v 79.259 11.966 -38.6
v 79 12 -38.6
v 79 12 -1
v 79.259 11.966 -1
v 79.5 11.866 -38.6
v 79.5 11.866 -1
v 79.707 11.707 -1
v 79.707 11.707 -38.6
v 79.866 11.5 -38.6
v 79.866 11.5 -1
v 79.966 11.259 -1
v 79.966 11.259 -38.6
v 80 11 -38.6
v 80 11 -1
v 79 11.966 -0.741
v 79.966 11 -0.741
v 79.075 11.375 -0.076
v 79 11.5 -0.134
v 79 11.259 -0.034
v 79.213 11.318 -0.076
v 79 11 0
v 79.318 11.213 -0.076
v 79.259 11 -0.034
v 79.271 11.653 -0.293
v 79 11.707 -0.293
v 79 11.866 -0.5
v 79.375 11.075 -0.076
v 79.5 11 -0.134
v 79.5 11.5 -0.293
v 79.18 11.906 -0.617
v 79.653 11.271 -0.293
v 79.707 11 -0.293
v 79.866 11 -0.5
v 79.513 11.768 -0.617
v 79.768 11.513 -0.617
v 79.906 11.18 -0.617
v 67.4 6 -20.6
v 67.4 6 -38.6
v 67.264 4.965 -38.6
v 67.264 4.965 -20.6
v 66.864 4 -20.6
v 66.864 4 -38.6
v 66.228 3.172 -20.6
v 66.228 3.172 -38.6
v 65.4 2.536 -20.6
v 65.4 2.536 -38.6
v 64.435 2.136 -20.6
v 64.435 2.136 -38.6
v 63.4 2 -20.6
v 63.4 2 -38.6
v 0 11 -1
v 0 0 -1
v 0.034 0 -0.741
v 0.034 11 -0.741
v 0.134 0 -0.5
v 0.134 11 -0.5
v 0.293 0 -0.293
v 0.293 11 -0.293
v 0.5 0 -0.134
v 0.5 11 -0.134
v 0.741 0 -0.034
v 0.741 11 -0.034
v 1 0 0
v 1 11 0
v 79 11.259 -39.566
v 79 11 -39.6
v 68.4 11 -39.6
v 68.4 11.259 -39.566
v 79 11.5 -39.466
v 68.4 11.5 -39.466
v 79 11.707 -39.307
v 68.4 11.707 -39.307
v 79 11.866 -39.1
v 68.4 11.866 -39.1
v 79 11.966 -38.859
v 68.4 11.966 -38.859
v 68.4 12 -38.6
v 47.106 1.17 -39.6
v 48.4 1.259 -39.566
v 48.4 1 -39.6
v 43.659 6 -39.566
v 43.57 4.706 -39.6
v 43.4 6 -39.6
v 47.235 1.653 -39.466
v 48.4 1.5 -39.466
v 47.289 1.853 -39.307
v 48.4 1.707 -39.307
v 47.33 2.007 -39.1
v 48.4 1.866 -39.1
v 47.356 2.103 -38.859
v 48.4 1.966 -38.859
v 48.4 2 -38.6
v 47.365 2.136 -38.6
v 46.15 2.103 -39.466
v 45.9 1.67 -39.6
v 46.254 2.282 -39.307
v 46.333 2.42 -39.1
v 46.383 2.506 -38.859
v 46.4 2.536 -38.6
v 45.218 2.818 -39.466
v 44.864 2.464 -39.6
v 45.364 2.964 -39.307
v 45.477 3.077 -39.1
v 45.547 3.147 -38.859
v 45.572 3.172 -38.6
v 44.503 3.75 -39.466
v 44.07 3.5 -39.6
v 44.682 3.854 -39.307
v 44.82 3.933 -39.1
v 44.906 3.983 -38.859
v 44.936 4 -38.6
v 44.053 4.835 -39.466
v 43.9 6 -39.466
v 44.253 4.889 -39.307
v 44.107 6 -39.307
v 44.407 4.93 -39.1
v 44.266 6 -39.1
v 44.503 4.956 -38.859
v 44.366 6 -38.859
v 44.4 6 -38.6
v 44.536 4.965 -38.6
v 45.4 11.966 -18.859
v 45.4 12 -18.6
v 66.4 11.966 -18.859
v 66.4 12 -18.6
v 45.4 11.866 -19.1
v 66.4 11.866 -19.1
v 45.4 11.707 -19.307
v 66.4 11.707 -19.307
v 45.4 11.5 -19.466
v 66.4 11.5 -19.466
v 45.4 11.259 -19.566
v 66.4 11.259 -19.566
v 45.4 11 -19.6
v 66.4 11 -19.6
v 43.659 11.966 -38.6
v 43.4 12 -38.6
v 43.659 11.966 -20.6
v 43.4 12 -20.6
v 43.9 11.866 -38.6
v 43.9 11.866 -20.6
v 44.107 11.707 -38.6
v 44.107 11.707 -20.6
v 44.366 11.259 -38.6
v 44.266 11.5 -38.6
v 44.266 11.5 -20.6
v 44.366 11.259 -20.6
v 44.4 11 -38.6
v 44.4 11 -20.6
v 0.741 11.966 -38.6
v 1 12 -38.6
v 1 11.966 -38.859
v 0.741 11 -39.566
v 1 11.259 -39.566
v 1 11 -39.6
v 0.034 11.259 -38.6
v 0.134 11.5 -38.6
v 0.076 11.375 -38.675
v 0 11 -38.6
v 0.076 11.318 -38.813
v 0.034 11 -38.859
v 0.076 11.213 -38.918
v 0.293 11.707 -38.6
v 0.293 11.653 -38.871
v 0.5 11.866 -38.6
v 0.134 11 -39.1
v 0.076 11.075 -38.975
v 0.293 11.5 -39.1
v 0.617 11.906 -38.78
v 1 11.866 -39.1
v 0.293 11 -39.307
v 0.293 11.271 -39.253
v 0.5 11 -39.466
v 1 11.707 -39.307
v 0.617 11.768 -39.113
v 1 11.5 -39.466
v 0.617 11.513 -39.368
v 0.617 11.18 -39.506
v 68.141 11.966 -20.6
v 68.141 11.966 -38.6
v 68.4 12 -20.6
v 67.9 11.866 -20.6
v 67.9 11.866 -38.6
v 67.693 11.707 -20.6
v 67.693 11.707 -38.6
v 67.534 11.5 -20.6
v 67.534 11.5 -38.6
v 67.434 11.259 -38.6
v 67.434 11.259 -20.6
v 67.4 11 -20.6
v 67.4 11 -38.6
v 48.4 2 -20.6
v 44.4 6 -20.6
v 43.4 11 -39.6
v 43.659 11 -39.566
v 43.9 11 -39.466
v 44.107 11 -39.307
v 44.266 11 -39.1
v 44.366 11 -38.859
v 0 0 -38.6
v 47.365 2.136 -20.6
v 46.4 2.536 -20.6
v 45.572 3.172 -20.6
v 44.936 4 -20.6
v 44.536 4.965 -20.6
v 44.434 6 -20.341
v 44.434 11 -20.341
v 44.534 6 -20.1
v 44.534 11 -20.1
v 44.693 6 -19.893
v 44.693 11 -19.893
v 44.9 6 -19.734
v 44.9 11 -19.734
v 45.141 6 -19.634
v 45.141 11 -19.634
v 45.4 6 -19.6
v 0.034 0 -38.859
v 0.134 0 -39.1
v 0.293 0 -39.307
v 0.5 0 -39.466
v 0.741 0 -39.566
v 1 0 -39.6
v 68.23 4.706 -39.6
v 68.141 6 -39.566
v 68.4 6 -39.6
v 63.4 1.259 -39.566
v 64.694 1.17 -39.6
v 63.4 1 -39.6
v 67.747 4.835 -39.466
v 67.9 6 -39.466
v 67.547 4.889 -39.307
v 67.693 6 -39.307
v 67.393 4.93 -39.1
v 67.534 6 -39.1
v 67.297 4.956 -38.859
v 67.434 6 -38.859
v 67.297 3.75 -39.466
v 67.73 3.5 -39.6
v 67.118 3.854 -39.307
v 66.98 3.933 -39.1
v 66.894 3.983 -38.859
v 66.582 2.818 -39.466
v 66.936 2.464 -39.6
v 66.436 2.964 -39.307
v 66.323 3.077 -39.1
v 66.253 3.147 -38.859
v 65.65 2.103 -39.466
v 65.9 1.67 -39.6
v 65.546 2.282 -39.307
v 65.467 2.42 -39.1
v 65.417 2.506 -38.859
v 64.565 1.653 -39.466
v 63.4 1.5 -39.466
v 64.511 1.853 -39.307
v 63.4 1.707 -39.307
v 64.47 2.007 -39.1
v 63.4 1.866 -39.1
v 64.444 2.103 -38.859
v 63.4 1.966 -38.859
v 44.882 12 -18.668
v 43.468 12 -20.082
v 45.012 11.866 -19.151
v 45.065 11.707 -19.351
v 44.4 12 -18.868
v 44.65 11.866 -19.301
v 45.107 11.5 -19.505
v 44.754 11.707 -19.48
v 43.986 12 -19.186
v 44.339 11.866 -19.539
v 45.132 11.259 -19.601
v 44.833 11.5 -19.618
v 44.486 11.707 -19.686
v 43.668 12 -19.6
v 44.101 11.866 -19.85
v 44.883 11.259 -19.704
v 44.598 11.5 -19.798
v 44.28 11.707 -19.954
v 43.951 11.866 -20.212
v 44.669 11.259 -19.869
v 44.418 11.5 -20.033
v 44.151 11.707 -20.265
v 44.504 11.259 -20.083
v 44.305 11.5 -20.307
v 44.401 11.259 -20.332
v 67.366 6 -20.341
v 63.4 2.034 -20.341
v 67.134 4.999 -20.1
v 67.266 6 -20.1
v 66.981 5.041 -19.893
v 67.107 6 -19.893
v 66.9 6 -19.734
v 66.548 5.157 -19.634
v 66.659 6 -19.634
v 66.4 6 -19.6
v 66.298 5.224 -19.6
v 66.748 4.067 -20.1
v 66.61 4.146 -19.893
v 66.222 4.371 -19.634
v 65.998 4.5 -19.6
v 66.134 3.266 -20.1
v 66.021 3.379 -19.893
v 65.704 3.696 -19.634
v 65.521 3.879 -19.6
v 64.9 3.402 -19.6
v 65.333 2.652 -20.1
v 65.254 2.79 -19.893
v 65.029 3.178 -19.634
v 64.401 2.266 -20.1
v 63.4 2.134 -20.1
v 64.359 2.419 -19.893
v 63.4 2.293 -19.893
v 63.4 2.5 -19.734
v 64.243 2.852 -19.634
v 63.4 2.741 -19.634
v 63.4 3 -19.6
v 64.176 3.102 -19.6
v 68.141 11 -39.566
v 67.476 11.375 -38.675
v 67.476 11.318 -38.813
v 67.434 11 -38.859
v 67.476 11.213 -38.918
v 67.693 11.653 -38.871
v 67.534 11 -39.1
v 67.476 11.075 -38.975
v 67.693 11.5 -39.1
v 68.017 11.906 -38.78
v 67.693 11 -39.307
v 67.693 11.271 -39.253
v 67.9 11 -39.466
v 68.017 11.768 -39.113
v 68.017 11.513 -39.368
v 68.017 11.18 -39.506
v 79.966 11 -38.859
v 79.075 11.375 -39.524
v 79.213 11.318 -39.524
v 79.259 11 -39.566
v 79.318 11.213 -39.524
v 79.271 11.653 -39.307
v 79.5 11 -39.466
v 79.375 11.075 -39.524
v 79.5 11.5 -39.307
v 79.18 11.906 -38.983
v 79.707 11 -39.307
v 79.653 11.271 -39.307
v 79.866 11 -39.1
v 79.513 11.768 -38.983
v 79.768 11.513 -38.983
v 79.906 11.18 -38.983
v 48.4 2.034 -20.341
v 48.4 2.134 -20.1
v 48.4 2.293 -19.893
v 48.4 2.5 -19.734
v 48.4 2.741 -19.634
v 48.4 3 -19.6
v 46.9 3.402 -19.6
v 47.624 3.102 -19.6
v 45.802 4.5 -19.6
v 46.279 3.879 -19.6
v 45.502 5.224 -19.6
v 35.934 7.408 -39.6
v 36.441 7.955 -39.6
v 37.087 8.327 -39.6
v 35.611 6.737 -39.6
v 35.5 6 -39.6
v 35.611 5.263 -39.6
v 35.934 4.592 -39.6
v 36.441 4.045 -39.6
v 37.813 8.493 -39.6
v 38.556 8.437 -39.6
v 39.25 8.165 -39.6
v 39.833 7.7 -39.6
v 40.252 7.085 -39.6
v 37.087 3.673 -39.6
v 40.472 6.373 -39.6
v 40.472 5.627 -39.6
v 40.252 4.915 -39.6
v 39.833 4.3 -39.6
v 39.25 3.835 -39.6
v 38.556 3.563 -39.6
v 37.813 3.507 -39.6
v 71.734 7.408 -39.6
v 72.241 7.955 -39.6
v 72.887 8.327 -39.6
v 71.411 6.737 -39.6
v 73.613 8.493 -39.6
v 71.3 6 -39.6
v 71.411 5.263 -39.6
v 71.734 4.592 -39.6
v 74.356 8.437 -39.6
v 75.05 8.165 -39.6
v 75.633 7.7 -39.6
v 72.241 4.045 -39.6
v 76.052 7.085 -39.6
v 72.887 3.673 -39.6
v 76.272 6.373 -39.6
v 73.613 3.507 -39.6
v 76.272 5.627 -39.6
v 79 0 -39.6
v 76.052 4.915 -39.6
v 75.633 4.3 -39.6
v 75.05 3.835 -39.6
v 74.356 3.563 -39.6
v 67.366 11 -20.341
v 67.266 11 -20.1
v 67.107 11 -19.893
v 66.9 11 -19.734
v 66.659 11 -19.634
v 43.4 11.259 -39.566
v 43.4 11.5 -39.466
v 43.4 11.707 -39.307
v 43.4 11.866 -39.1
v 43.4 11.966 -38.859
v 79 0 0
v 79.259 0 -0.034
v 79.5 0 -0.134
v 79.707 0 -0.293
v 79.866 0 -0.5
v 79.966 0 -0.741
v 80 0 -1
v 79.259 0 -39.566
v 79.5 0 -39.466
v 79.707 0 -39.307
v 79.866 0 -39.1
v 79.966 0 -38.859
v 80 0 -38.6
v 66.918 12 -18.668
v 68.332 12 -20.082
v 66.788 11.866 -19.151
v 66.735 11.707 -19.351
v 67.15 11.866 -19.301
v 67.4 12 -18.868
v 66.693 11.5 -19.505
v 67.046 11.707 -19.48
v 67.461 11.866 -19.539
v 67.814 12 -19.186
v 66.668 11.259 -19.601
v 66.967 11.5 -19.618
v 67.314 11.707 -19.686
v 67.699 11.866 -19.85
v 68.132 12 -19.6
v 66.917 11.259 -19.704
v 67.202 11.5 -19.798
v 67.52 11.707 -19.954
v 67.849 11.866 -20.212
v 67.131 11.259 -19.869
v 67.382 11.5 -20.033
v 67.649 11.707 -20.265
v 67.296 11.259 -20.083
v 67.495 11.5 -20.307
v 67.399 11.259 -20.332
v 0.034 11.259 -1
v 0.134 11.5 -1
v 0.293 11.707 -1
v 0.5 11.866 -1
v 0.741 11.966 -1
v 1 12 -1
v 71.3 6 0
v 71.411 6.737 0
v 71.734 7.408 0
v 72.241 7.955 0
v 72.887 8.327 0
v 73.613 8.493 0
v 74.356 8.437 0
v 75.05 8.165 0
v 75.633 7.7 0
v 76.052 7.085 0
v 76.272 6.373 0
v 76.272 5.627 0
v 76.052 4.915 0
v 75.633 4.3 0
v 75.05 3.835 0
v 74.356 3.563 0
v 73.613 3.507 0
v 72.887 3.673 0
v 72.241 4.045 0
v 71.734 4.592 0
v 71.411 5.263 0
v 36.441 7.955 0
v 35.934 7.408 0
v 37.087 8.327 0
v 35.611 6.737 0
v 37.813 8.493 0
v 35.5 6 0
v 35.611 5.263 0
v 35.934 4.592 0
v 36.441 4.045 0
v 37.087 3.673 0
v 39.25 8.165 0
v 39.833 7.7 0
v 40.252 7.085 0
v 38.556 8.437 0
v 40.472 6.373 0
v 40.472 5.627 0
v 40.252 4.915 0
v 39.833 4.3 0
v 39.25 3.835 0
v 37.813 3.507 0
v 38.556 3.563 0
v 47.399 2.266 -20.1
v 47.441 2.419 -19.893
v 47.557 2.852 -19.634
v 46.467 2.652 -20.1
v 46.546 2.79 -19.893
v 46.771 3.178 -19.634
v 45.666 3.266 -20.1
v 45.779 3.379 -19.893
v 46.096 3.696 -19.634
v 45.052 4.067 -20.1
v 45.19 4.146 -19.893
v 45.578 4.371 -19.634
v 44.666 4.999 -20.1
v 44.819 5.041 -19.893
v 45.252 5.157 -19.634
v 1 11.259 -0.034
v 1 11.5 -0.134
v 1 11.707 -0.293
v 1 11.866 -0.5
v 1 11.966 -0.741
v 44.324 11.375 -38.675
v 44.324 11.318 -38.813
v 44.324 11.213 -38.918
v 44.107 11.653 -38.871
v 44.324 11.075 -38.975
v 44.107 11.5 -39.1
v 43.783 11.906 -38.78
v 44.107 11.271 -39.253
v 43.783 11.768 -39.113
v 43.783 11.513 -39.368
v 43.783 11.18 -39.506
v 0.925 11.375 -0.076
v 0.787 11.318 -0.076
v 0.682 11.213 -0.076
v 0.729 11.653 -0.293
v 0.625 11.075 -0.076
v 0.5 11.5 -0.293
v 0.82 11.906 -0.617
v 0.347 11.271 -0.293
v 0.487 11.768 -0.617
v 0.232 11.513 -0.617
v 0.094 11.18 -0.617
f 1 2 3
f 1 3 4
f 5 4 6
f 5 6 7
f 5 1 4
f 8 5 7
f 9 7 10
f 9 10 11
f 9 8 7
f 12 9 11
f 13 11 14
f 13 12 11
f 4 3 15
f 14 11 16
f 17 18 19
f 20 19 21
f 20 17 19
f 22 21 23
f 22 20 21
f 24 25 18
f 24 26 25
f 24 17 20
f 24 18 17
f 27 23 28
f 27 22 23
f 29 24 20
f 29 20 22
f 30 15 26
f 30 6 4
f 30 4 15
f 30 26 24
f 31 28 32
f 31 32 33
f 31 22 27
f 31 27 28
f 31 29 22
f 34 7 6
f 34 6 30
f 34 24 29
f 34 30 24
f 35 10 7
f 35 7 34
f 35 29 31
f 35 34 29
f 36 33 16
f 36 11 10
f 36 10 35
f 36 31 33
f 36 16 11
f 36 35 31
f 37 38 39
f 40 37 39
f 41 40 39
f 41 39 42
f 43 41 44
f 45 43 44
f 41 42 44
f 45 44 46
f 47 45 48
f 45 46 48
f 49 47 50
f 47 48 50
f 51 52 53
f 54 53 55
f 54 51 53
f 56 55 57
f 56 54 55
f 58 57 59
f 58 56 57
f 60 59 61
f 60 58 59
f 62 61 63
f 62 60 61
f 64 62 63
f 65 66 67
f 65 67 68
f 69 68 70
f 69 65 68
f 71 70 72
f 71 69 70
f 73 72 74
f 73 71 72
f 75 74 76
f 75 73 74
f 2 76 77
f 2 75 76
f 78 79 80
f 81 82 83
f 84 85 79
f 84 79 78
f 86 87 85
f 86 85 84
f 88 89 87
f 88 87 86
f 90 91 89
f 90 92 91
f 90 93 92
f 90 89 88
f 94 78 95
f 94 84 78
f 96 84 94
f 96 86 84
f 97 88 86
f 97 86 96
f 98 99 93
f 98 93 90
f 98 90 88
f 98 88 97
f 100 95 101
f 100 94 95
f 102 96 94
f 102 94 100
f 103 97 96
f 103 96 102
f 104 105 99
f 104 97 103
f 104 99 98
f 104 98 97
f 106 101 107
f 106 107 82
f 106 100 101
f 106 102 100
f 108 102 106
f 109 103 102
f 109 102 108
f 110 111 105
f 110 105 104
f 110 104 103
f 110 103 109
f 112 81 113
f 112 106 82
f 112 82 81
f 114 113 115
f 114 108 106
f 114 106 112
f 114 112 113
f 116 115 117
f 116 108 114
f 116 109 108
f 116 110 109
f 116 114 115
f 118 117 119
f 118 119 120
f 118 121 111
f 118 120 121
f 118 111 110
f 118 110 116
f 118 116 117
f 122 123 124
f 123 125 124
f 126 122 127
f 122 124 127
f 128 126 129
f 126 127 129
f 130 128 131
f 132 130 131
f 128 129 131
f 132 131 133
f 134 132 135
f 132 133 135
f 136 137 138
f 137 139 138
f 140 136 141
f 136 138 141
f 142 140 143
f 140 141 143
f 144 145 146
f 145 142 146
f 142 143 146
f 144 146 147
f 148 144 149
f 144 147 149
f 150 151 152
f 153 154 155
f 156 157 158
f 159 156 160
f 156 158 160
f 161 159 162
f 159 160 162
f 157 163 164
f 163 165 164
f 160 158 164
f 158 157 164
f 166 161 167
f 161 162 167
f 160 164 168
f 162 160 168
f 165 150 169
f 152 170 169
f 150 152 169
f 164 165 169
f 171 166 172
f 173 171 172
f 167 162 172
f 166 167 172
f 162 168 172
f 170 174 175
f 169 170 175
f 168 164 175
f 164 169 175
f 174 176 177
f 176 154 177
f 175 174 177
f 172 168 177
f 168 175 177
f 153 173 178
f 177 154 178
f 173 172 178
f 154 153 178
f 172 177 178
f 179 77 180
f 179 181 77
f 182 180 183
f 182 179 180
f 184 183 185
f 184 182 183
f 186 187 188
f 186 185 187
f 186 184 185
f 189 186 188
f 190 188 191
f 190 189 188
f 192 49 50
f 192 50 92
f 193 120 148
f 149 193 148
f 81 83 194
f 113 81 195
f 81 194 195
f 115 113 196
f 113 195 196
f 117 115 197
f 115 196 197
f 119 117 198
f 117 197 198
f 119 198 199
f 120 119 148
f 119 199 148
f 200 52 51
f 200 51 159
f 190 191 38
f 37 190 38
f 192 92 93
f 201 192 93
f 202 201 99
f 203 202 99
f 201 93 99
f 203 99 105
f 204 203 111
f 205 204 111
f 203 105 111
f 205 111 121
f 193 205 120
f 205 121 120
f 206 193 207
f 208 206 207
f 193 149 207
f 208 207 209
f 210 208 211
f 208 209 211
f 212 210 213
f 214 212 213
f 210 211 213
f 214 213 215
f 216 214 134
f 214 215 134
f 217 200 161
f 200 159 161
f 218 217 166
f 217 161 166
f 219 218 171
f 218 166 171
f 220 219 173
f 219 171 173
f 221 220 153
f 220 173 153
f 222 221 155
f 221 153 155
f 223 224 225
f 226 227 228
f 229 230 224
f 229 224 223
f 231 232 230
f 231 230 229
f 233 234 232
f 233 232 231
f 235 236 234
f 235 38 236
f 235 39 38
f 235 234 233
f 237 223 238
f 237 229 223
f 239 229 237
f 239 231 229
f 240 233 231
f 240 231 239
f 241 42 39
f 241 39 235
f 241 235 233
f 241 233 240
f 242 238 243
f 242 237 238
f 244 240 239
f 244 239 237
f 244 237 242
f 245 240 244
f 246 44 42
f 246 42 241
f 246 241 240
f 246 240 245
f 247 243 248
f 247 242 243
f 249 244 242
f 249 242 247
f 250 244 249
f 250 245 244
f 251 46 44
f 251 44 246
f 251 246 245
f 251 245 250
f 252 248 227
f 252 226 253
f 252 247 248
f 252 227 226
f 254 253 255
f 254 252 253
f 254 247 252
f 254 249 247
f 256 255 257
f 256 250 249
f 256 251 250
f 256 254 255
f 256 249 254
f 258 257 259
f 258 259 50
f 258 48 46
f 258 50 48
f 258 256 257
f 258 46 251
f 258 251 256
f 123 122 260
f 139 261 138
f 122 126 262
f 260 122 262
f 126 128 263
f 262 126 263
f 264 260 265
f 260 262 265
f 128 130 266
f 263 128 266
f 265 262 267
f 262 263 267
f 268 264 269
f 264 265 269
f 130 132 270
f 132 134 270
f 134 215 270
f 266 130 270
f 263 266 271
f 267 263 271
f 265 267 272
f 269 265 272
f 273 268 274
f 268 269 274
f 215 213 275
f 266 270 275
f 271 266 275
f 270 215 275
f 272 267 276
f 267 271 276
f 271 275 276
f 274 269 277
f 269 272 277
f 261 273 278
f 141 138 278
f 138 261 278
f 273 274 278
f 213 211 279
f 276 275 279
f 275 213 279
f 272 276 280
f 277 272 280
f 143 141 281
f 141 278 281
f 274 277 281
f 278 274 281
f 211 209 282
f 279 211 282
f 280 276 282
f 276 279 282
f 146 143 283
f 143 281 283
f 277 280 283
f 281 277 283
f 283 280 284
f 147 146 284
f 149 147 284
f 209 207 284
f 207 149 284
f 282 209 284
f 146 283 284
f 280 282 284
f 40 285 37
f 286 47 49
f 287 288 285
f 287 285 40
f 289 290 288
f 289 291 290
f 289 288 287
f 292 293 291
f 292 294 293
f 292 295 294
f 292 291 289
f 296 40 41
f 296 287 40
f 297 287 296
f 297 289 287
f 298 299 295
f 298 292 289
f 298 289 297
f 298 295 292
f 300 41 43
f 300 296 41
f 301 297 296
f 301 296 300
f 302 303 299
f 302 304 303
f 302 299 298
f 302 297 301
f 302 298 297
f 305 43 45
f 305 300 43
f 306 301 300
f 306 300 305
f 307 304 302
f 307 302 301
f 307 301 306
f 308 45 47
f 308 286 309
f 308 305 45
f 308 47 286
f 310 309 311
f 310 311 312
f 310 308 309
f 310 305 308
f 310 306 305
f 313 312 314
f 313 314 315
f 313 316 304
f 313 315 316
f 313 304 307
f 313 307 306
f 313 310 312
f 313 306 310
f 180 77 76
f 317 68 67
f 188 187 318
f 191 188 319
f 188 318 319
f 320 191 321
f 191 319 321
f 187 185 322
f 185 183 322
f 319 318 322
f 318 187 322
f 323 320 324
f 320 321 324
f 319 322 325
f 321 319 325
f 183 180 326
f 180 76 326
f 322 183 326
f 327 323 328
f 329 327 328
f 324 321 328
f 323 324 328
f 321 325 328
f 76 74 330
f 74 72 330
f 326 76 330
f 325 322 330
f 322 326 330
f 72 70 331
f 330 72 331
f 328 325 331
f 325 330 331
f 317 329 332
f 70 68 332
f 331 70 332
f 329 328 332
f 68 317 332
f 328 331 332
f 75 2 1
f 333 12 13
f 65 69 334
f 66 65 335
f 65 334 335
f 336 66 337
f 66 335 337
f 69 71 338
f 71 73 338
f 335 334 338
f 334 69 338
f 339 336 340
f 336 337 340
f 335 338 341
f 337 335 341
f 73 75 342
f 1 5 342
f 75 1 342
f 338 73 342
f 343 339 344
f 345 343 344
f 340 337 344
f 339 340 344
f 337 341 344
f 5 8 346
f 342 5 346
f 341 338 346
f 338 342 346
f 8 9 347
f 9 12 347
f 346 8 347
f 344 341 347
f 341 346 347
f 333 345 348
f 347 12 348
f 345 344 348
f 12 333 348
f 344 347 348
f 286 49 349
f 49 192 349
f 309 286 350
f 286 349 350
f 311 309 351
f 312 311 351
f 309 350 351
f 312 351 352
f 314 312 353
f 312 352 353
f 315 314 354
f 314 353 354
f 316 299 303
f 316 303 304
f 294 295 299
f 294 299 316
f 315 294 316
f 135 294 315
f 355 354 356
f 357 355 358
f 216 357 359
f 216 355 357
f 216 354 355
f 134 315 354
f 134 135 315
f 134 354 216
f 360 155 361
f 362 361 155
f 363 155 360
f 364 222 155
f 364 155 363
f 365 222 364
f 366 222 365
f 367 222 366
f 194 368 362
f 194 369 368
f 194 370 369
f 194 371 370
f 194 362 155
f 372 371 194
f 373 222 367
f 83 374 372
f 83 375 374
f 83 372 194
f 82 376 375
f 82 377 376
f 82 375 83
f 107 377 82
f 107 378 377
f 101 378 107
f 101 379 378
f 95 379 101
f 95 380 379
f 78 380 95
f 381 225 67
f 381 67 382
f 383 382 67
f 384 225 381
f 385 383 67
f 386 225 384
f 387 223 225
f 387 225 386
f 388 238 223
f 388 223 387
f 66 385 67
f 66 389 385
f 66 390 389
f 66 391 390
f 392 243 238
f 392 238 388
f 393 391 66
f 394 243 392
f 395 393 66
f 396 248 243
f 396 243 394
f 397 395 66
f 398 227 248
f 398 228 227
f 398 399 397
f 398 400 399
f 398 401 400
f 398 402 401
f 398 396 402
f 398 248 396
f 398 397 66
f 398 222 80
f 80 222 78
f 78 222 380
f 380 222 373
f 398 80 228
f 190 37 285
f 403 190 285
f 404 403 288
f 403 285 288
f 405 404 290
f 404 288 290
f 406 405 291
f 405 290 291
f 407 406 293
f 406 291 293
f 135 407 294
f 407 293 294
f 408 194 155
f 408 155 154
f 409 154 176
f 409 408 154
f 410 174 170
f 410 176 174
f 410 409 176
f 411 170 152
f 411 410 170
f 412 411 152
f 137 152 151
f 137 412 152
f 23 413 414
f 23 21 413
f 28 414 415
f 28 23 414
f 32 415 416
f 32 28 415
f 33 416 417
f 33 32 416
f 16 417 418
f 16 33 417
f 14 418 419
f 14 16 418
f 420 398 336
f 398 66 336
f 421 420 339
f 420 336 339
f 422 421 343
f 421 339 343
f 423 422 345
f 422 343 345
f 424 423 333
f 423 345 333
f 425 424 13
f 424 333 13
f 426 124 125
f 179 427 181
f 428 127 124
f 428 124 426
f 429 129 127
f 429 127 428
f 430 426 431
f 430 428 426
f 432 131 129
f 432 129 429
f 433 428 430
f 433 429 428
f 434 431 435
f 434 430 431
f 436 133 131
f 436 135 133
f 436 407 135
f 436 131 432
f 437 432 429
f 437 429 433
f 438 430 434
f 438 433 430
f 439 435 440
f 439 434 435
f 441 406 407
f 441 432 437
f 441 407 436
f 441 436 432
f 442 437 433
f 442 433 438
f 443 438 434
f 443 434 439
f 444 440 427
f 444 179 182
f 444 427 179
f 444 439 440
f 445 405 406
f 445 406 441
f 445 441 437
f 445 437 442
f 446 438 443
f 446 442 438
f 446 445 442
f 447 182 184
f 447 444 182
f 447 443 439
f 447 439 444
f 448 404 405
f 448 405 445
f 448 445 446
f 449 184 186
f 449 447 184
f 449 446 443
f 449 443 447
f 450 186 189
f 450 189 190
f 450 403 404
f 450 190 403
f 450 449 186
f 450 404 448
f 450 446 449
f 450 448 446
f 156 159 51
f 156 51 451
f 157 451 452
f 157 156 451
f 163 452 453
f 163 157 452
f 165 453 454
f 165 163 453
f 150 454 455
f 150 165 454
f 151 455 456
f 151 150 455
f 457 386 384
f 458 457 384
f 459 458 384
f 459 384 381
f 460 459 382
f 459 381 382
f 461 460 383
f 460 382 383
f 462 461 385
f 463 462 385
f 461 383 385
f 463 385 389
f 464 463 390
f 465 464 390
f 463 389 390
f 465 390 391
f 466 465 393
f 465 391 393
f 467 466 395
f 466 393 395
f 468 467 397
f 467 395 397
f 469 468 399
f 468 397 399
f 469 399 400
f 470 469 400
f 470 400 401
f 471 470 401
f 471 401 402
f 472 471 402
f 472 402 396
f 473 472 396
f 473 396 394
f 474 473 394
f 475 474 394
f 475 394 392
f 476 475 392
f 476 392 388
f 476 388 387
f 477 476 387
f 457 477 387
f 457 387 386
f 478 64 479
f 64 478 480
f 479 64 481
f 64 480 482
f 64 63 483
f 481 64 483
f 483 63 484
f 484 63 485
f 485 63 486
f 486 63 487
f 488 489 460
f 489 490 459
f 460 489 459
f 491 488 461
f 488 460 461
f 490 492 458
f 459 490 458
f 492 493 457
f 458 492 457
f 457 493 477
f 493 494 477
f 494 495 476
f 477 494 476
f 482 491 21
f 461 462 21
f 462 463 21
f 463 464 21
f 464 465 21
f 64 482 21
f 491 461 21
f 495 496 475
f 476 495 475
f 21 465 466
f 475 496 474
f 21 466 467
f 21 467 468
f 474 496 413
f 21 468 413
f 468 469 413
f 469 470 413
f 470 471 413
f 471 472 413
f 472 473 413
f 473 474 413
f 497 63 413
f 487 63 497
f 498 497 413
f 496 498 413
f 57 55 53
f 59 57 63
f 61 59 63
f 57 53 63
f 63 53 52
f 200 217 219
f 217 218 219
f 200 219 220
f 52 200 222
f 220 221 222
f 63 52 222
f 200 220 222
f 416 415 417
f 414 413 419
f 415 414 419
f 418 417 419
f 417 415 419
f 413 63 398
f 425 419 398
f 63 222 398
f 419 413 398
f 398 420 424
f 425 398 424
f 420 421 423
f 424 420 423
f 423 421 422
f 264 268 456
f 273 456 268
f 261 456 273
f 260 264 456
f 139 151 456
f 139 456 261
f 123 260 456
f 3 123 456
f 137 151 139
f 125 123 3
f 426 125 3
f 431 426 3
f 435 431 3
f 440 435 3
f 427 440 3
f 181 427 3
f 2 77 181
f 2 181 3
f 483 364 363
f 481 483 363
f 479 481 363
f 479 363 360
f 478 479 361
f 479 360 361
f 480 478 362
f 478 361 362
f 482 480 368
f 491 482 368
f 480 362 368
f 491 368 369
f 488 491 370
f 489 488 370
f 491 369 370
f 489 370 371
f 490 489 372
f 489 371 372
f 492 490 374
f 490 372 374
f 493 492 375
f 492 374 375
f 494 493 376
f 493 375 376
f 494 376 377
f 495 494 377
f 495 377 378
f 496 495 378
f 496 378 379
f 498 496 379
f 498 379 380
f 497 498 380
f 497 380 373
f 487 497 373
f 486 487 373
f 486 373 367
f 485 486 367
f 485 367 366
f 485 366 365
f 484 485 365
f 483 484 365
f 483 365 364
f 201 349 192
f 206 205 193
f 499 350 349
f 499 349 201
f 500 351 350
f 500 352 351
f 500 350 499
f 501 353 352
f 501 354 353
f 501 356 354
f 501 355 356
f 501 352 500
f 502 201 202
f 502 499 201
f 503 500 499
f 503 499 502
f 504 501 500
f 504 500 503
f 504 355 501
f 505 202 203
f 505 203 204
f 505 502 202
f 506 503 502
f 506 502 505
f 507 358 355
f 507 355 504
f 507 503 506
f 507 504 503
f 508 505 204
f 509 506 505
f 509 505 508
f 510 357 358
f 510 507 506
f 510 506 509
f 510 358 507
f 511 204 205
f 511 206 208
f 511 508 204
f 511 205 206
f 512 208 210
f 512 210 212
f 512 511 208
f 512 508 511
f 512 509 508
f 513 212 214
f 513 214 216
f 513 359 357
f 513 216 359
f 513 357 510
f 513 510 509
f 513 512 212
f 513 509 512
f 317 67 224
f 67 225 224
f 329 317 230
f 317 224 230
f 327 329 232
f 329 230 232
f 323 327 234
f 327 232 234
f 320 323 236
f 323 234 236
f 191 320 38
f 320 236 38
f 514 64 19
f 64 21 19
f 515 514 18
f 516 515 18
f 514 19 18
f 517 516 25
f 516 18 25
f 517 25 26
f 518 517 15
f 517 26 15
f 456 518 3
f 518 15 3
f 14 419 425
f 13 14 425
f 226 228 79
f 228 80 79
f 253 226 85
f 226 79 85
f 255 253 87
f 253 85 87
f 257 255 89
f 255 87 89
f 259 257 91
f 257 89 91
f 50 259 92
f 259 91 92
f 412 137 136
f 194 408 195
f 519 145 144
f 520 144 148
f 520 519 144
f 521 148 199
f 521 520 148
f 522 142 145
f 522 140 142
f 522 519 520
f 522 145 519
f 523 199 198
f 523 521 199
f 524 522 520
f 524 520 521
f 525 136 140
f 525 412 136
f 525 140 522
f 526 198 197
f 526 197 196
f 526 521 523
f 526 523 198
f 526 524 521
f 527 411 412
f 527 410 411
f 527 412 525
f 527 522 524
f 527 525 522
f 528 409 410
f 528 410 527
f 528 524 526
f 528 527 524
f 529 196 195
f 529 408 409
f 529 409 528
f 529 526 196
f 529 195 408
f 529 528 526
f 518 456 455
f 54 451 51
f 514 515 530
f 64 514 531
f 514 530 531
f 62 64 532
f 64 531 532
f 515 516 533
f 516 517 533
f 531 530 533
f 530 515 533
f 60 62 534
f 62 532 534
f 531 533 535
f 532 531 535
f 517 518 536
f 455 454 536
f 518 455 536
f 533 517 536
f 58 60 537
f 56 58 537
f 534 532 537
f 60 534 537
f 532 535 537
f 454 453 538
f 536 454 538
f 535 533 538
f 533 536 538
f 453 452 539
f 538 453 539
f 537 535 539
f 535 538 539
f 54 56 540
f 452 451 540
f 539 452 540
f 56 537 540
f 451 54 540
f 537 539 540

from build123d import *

# Parameters (mm, degrees)
SKETCH1_W           = 80
SKETCH1_H           = 39.6
BOSS_EXTRUDE1_DEPTH = 12
CUT_EXTRUDE2_REACH  = 92.068
SKETCH2_R           = 2.5
CUT_EXTRUDE3_DEPTH  = 20
FILLET1_R           = 1


with BuildPart() as part:
    # Sketch1 → Boss-Extrude1 (new body)
    with BuildSketch(Plane(origin=(0, 0, 0), x_dir=(1, 0, 0), z_dir=(0, 1, 0))):
        with Locations((40, 19.8)):
            Rectangle(SKETCH1_W, SKETCH1_H)
    extrude(amount=BOSS_EXTRUDE1_DEPTH)

    # Sketch2 → Cut-Extrude2 (cut, up to next)
    with BuildSketch(Plane(origin=(0, 0, -39.6), x_dir=(-1, 0, 0), z_dir=(0, 0, -1)), mode=Mode.PRIVATE) as cut_extrude2_sk1:
        with Locations((-38, 6)):
            Circle(SKETCH2_R)
    cut_extrude2_tool1 = extrude(cut_extrude2_sk1.sketch, amount=-CUT_EXTRUDE2_REACH, mode=Mode.PRIVATE) & part.part
    # Sketch2 → Cut-Extrude2 (cut, up to next)
    with BuildSketch(Plane(origin=(0, 0, -39.6), x_dir=(-1, 0, 0), z_dir=(0, 0, -1)), mode=Mode.PRIVATE) as cut_extrude2_sk2:
        with Locations((-73.8, 6)):
            Circle(SKETCH2_R)
    cut_extrude2_tool2 = extrude(cut_extrude2_sk2.sketch, amount=-CUT_EXTRUDE2_REACH, mode=Mode.PRIVATE) & part.part
    add(cut_extrude2_tool1.solids().sort_by_distance((38, 6, -39.6))[0], mode=Mode.SUBTRACT)
    add(cut_extrude2_tool2.solids().sort_by_distance((73.8, 6, -39.6))[0], mode=Mode.SUBTRACT)

    # Sketch3 → Cut-Extrude3 (cut)
    with BuildSketch(Plane(origin=(0, 0, -39.6), x_dir=(-1, 0, 0), z_dir=(0, 0, -1))):
        with BuildLine():
            Line((-63.4, 2), (-48.4, 2))
            ThreePointArc((-48.4, 2), (-45.571572875, 3.171572875), (-44.4, 6))
            Line((-44.4, 6), (-44.4, 12))
            Line((-44.4, 12), (-67.4, 12))
            Line((-67.4, 12), (-67.4, 6))
            ThreePointArc((-67.4, 6), (-66.228427125, 3.171572875), (-63.4, 2))
        make_face()
    extrude(amount=-CUT_EXTRUDE3_DEPTH, mode=Mode.SUBTRACT)

    # Fillet1
    fillet1_edges = [part.edges().sort_by_distance(p)[0] for p in [
        (80, 12, -19.8),
        (73.7, 12, -39.6),
        (22.2, 12, -39.6),
        (66.228427125, 3.171572875, -19.6),
        (67.4, 9, -19.6),
        (55.9, 12, -19.6),
        (67.4, 12, -29.6),
        (44.4, 9, -19.6),
        (44.4, 12, -29.6),
        (45.571572875, 3.171572875, -19.6),
        (55.9, 2, -19.6),
        (66.228427125, 3.171572875, -39.6),
        (55.9, 2, -39.6),
        (45.571572875, 3.171572875, -39.6),
        (44.4, 9, -39.6),
        (67.4, 9, -39.6),
        (0, 12, -19.8),
        (40, 12, 0),
        (0, 6, -39.6),
        (80, 6, -39.6),
        (80, 6, 0),
        (0, 6, 0),
    ]]
    fillet(fillet1_edges, radius=FILLET1_R)


solid = part.part
